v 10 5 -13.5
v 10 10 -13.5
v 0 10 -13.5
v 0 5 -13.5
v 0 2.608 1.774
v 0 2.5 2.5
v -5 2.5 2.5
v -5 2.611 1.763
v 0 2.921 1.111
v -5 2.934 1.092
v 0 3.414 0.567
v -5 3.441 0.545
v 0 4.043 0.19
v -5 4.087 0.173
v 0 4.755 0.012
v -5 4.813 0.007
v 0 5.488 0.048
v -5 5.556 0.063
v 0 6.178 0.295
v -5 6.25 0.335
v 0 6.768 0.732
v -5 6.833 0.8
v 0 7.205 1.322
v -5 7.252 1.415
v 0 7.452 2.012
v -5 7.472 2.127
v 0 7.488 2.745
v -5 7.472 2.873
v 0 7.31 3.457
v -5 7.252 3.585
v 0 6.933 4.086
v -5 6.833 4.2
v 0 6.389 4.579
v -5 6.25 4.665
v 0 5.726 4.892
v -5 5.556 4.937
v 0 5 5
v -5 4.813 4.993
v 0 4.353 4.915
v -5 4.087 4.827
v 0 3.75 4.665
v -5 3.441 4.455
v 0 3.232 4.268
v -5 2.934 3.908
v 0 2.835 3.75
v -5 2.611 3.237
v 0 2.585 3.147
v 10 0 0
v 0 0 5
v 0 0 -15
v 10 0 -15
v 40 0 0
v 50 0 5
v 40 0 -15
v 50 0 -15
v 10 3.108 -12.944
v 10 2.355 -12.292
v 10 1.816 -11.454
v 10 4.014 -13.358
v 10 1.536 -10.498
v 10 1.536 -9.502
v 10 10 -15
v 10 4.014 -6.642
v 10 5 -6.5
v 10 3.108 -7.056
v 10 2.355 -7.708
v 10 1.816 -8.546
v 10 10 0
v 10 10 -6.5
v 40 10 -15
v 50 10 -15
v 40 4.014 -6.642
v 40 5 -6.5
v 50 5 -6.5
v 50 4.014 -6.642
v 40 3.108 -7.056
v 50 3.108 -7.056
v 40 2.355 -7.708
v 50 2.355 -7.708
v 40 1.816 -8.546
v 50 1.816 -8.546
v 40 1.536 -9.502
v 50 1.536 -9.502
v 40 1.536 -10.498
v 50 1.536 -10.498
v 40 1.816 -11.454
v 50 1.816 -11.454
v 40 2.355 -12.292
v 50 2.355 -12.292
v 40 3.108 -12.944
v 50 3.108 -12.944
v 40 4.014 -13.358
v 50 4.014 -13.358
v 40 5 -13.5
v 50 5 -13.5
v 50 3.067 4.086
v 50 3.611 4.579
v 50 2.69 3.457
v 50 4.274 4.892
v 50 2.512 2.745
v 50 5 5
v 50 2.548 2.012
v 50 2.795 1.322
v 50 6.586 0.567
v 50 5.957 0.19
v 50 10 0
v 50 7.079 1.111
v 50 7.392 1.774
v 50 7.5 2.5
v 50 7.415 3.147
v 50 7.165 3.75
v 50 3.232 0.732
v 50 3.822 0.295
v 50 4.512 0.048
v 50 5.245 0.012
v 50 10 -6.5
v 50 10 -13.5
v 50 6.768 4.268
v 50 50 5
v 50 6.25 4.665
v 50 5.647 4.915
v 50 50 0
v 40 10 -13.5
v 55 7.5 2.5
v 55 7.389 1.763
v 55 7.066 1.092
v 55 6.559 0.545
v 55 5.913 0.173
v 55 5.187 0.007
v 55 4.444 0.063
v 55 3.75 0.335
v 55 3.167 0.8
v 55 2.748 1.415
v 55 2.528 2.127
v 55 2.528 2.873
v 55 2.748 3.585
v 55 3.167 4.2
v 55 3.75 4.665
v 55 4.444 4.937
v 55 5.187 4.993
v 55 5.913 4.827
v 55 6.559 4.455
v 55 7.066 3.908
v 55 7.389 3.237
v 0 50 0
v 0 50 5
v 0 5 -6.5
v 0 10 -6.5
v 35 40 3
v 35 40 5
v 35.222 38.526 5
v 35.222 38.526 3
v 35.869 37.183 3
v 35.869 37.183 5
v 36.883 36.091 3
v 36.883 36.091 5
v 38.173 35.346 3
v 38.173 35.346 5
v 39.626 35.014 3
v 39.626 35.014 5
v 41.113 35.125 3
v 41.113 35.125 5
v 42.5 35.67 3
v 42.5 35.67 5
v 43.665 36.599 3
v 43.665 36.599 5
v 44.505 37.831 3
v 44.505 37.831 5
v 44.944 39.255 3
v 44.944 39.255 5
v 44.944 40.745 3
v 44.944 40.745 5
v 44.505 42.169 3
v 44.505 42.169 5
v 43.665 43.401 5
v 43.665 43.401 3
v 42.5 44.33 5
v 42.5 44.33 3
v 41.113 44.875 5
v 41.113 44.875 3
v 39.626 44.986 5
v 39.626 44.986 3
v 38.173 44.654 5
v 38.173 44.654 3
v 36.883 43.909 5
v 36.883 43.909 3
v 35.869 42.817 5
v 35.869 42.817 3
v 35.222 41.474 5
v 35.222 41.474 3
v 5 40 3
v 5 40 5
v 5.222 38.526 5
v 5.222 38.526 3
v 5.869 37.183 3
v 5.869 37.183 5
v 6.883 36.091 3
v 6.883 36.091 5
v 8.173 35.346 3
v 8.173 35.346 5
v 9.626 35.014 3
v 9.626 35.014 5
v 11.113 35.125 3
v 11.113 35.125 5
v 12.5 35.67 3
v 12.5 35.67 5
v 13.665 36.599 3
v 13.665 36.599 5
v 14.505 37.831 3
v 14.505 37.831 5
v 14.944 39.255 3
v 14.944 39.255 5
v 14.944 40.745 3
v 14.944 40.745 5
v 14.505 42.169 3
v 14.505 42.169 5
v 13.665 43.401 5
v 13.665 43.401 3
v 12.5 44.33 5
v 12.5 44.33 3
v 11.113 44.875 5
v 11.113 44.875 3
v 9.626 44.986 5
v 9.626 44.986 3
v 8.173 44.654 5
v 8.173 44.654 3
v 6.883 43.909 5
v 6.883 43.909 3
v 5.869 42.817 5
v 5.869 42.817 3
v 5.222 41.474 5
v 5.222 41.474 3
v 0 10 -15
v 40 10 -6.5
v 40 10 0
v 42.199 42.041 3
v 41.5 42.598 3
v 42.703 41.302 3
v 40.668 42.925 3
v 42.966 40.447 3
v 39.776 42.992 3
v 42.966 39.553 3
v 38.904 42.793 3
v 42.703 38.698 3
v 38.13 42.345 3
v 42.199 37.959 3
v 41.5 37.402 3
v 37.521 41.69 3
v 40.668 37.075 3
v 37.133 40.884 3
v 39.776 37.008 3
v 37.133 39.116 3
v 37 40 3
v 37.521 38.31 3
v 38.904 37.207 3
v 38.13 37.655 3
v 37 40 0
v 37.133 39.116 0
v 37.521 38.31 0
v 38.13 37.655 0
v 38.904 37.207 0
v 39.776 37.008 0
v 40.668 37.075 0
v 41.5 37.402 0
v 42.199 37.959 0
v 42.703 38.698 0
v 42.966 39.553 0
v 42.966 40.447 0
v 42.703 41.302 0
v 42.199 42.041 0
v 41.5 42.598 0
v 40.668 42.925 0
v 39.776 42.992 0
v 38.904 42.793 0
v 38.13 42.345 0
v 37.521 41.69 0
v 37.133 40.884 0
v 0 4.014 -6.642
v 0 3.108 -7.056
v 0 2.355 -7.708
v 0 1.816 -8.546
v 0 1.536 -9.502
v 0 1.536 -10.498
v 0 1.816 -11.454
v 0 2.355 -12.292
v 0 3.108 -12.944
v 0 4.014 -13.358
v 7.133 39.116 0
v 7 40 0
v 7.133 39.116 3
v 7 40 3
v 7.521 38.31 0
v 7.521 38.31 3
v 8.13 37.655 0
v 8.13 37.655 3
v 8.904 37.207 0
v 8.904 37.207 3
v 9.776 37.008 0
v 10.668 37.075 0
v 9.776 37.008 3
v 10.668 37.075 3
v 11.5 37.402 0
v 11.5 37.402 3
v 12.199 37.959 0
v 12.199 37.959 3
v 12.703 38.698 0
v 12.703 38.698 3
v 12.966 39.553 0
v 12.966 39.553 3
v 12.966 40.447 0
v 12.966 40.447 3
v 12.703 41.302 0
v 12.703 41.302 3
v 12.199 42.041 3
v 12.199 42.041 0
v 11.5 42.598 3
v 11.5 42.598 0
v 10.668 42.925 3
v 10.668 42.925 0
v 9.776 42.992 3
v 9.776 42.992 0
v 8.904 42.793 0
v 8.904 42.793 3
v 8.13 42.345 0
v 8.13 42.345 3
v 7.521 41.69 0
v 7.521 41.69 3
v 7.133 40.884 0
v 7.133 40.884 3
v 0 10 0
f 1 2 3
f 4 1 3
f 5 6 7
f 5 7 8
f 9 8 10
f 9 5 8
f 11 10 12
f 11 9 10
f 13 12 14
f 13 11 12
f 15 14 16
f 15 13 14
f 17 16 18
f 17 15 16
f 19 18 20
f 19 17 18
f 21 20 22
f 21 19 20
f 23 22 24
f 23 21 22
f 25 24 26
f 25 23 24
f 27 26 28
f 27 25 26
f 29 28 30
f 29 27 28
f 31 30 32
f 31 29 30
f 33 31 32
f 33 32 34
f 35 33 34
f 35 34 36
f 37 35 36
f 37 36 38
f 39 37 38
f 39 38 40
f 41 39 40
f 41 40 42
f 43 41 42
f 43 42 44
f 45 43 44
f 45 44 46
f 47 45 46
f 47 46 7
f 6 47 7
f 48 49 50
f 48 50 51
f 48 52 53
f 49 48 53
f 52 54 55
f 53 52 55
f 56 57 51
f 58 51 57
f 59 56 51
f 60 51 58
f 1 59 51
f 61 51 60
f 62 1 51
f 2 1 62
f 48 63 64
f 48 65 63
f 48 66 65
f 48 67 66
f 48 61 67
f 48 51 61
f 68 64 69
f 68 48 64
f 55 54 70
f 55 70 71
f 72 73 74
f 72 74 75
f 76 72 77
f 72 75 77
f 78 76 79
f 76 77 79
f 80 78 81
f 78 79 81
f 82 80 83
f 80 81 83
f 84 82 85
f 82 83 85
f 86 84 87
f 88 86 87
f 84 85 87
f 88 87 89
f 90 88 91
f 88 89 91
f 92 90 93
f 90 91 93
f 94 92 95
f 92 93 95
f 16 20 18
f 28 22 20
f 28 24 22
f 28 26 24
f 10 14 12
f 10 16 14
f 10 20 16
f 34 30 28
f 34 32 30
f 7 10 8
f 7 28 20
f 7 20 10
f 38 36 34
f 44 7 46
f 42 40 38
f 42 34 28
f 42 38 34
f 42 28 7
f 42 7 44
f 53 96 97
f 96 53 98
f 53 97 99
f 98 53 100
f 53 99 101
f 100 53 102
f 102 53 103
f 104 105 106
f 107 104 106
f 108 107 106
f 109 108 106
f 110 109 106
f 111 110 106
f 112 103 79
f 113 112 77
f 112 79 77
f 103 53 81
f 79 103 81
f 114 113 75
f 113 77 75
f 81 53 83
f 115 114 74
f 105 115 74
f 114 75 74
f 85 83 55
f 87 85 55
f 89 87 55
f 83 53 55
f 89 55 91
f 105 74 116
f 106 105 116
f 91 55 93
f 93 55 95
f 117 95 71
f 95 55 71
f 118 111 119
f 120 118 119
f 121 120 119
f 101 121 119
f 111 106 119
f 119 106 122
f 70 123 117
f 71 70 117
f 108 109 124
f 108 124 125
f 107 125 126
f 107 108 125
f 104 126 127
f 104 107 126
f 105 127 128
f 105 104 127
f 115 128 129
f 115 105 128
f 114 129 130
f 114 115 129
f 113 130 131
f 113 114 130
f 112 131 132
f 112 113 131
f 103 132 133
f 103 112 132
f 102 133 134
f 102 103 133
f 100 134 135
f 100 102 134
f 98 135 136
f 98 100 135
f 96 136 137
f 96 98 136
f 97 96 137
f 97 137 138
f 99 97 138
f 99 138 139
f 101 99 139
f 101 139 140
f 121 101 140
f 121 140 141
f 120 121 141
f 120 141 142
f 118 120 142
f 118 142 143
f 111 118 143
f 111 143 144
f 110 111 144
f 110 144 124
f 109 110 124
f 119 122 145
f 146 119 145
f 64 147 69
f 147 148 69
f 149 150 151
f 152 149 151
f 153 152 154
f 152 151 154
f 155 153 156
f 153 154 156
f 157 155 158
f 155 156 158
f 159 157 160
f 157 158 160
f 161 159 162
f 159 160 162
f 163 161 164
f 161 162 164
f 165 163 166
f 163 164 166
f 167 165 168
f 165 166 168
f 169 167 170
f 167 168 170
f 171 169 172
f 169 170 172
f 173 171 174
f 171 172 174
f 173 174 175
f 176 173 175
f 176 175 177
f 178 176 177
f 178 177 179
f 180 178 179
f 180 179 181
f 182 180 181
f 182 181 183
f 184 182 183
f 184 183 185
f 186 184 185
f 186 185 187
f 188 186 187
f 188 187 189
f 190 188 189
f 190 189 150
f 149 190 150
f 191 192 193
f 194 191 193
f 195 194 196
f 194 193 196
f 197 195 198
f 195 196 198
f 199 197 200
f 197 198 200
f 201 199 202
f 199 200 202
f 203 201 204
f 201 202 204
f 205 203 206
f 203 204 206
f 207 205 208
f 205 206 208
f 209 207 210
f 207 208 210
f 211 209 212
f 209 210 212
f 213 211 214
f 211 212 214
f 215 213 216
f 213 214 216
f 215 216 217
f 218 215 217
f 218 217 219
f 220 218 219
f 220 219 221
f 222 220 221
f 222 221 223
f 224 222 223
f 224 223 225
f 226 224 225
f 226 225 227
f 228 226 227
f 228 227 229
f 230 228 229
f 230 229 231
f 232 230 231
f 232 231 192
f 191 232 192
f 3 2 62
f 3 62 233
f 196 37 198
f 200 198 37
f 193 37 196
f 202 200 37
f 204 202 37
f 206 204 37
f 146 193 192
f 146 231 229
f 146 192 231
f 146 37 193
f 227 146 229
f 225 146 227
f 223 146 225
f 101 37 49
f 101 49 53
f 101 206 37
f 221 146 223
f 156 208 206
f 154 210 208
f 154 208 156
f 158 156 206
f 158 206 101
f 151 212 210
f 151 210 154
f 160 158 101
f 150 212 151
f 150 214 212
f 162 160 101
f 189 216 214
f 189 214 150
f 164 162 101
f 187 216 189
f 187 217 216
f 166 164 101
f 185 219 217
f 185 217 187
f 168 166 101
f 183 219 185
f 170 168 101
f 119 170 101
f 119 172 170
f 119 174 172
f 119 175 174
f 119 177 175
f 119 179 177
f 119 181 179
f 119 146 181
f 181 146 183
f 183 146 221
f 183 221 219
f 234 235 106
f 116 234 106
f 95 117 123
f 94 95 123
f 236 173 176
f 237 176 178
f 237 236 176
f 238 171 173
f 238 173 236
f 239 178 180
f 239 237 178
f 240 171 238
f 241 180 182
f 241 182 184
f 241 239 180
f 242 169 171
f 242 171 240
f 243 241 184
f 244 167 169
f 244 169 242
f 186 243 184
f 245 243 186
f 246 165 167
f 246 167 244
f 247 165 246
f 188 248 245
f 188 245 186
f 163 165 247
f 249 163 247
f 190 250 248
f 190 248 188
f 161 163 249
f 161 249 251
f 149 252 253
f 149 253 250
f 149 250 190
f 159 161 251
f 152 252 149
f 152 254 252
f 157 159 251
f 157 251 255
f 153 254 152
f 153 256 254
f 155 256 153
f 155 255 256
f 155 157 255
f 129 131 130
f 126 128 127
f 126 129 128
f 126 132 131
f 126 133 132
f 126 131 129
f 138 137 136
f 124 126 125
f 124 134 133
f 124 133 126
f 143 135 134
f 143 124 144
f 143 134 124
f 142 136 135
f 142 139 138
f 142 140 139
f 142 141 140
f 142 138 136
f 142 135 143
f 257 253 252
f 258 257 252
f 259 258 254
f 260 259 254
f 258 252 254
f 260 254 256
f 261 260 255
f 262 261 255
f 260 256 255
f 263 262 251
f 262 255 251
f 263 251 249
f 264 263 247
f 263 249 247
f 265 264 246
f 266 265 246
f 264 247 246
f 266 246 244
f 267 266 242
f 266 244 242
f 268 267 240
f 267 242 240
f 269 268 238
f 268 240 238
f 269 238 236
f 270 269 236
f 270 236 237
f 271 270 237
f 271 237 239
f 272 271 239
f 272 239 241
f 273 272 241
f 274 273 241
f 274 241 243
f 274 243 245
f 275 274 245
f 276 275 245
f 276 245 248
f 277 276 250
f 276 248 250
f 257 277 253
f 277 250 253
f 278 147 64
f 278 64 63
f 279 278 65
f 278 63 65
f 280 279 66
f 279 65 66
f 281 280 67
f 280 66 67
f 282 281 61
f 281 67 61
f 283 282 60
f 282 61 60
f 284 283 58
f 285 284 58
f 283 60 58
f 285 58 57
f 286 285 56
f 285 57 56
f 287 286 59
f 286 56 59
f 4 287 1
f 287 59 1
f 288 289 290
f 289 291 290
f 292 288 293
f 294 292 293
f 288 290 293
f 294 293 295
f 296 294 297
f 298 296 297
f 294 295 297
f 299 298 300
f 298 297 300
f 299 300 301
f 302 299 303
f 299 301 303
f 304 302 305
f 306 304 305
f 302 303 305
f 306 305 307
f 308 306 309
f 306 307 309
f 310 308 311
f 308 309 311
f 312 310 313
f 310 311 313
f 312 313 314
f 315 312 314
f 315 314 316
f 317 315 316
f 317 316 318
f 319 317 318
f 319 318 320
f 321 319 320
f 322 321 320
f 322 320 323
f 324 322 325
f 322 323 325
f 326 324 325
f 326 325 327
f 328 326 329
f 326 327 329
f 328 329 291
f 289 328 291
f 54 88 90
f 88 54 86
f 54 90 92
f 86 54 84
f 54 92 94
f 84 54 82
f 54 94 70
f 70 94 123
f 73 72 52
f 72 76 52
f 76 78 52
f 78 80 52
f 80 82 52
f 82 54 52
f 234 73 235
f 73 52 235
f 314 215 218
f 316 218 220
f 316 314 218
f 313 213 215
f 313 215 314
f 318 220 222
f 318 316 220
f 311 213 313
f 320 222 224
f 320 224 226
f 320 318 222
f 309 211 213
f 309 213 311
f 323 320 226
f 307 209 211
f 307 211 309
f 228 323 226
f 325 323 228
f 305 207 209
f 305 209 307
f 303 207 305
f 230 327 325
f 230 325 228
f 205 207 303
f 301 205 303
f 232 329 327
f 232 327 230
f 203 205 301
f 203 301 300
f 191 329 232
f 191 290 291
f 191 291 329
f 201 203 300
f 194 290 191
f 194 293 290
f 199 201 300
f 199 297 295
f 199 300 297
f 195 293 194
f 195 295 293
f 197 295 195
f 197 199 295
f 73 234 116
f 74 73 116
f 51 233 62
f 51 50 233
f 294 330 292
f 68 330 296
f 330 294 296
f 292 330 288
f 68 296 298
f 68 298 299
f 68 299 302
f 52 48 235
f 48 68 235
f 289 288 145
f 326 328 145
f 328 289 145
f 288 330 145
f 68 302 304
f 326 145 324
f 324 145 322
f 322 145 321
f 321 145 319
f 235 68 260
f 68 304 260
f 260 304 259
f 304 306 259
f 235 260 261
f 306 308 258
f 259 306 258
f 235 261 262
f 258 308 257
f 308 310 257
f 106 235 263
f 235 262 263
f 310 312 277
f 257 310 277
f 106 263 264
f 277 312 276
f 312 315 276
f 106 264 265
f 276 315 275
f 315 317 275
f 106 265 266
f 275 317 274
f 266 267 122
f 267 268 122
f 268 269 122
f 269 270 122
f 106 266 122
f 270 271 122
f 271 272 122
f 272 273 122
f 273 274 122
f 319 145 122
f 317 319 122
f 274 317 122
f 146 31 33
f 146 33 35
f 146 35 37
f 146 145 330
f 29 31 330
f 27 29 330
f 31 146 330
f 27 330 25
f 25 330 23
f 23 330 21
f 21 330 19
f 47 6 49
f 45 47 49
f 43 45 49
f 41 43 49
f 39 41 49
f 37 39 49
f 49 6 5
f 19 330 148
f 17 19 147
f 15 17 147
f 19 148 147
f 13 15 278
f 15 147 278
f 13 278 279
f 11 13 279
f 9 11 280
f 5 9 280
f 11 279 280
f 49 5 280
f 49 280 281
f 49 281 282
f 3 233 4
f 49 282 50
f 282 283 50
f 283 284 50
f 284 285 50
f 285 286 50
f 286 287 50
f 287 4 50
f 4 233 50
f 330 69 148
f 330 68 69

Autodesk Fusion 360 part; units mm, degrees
sketch "Sketch1" plane through (0, 0, 0) normal (0, 0, 1) x (1, 0, 0)
  line L0 (0, 0) -> (50, 0)
  line L1 (50, 0) -> (50, 50)
  line L2 (50, 50) -> (0, 50)
  line L3 (0, 50) -> (0, 0)
  dimension "d1" = 50
  dimension "d2" = 50
extrude "Extrude1" add sketch "Sketch1" along normal blind 5
sketch "Sketch2" plane through (0, 0, 5) normal (0, 0, 1) x (-1, 0, 0)
  line L0 (0, -50) -> (0, 0)
  line L1 (0, 0) -> (-50, 0)
  line L2 (-50, 0) -> (-50, -50)
  line L3 (-50, -50) -> (0, -50)
  circle A0 centre (-10, -40) radius 5
  circle A1 centre (-40, -40) radius 5
  dimension "d5" = 10
  dimension "d6" = 10
extrude "Extrude2" cut sketch "Sketch2" against normal blind 2 contours A0 | A1
sketch "Sketch3" plane through (0, 0, 3) normal (0, 0, 1) x (-1, 0, 0)
  circle A0 centre (-10, -40) radius 5
  circle A1 centre (-10, -40) radius 3
  circle A2 centre (-40, -40) radius 3
  dimension "d9" = 6
  dimension "d10" = 6
extrude "Extrude3" cut sketch "Sketch3" against normal blind 5 contours A1 | A2
sketch "Sketch4" plane through (0, 0, 0) normal (0, 0, -1) x (1, 0, 0)
  circle A0 centre (10, -40) radius 3
  circle A1 centre (40, -40) radius 3
  line L0 (0, 0) -> (0, -50)
  line L1 (0, -50) -> (50, -50)
  line L2 (50, -50) -> (50, 0)
  line L3 (50, 0) -> (0, 0)
  line L4 (0, 0) -> (10, 0)
  line L5 (10, 0) -> (10, -10)
  line L6 (10, -10) -> (0, -10)
  line L7 (0, -10) -> (0, 0)
  line L8 (50, 0) -> (40, 0)
  line L9 (40, 0) -> (40, -10)
  line L10 (40, -10) -> (50, -10)
  line L11 (50, -10) -> (50, 0)
  dimension "d13" = 10
  dimension "d14" = 10
  dimension "d15" = 10
  dimension "d16" = 10
extrude "Extrude4" add sketch "Sketch4" along normal blind 15 contours L0 L3 L4 L5 L6 L7 | L2 L3 L8 L9 L10 L11
sketch "Sketch5" plane through (50, 0, 0) normal (1, 0, 0) x (0, 1, 0)
  line L0 (10, 0) -> (50, 0)
  line L1 (50, 0) -> (50, 5)
  line L2 (50, 5) -> (0, 5)
  line L3 (0, 5) -> (0, -15)
  line L4 (0, -15) -> (10, -15)
  line L5 (10, -15) -> (10, 0)
  circle A0 centre (5, -10) radius 3.5
  dimension "d19" = 7
extrude "Extrude5" cut sketch "Sketch5" against normal blind 50 contours A0
sketch "Sketch6" plane through (0, 10, 0) normal (0, 1, 0) x (-1, 0, 0)
  line L0 (-40, 0) -> (-50, 0)
  line L1 (-50, 0) -> (-50, -15)
  line L2 (-50, -15) -> (-40, -15)
  line L3 (-40, -15) -> (-40, 0)
  line L4 (45, -6.5) -> (-55, -6.5)
  line L5 (-55, -6.5) -> (-55, -13.5)
  line L6 (-55, -13.5) -> (45, -13.5)
  line L7 (45, -13.5) -> (45, -6.5)
  line L8 (45, -6.5) -> (-55, -13.5) construction
  line L9 (-55, -6.5) -> (45, -13.5) construction
  point P0 (-5, -10)
  dimension "d22" = 100
  dimension "d23" = 7
extrude "Extrude6" cut sketch "Sketch6" against normal blind 5 contours L3 L4 L6 L7 | L1 L3 L4 L6 | L1 L4 L5 L6
sketch "Sketch7" plane through (50, 0, 0) normal (1, 0, 0) x (0, 1, 0)
  line L0 (5, -6.5) -> (10, -6.5)
  line L1 (10, -6.5) -> (10, 0)
  line L2 (10, 0) -> (50, 0)
  line L3 (50, 0) -> (50, 5)
  line L4 (50, 5) -> (0, 5)
  line L5 (0, 5) -> (0, -15)
  line L6 (0, -15) -> (10, -15)
  line L7 (10, -15) -> (10, -13.5)
  line L8 (10, -13.5) -> (5, -13.5)
  arc A0 (5, -6.5) -> (5, -13.5) centre (5, -10) ccw
  circle A1 centre (5, 2.5) radius 2.5
  dimension "d26" = 5
extrude "Extrude7" add sketch "Sketch7" along normal blind 5 contours A1
sketch "Sketch8" plane through (0, 0, 0) normal (-1, 0, 0) x (0, -1, 0)
  line L0 (-10, -6.5) -> (-5, -6.5)
  arc A0 (-5, -13.5) -> (-5, -6.5) centre (-5, -10) ccw
  line L1 (-5, -13.5) -> (-10, -13.5)
  line L2 (-10, -13.5) -> (-10, -15)
  line L3 (-10, -15) -> (0, -15)
  line L4 (0, -15) -> (0, 5)
  line L5 (0, 5) -> (-50, 5)
  line L6 (-50, 5) -> (-50, 0)
  line L7 (-50, 0) -> (-10, 0)
  line L8 (-10, 0) -> (-10, -6.5)
  circle A1 centre (-5, 2.5) radius 2.5
  dimension "d29" = 5
extrude "Extrude8" add sketch "Sketch8" along normal blind 5 contours A1
